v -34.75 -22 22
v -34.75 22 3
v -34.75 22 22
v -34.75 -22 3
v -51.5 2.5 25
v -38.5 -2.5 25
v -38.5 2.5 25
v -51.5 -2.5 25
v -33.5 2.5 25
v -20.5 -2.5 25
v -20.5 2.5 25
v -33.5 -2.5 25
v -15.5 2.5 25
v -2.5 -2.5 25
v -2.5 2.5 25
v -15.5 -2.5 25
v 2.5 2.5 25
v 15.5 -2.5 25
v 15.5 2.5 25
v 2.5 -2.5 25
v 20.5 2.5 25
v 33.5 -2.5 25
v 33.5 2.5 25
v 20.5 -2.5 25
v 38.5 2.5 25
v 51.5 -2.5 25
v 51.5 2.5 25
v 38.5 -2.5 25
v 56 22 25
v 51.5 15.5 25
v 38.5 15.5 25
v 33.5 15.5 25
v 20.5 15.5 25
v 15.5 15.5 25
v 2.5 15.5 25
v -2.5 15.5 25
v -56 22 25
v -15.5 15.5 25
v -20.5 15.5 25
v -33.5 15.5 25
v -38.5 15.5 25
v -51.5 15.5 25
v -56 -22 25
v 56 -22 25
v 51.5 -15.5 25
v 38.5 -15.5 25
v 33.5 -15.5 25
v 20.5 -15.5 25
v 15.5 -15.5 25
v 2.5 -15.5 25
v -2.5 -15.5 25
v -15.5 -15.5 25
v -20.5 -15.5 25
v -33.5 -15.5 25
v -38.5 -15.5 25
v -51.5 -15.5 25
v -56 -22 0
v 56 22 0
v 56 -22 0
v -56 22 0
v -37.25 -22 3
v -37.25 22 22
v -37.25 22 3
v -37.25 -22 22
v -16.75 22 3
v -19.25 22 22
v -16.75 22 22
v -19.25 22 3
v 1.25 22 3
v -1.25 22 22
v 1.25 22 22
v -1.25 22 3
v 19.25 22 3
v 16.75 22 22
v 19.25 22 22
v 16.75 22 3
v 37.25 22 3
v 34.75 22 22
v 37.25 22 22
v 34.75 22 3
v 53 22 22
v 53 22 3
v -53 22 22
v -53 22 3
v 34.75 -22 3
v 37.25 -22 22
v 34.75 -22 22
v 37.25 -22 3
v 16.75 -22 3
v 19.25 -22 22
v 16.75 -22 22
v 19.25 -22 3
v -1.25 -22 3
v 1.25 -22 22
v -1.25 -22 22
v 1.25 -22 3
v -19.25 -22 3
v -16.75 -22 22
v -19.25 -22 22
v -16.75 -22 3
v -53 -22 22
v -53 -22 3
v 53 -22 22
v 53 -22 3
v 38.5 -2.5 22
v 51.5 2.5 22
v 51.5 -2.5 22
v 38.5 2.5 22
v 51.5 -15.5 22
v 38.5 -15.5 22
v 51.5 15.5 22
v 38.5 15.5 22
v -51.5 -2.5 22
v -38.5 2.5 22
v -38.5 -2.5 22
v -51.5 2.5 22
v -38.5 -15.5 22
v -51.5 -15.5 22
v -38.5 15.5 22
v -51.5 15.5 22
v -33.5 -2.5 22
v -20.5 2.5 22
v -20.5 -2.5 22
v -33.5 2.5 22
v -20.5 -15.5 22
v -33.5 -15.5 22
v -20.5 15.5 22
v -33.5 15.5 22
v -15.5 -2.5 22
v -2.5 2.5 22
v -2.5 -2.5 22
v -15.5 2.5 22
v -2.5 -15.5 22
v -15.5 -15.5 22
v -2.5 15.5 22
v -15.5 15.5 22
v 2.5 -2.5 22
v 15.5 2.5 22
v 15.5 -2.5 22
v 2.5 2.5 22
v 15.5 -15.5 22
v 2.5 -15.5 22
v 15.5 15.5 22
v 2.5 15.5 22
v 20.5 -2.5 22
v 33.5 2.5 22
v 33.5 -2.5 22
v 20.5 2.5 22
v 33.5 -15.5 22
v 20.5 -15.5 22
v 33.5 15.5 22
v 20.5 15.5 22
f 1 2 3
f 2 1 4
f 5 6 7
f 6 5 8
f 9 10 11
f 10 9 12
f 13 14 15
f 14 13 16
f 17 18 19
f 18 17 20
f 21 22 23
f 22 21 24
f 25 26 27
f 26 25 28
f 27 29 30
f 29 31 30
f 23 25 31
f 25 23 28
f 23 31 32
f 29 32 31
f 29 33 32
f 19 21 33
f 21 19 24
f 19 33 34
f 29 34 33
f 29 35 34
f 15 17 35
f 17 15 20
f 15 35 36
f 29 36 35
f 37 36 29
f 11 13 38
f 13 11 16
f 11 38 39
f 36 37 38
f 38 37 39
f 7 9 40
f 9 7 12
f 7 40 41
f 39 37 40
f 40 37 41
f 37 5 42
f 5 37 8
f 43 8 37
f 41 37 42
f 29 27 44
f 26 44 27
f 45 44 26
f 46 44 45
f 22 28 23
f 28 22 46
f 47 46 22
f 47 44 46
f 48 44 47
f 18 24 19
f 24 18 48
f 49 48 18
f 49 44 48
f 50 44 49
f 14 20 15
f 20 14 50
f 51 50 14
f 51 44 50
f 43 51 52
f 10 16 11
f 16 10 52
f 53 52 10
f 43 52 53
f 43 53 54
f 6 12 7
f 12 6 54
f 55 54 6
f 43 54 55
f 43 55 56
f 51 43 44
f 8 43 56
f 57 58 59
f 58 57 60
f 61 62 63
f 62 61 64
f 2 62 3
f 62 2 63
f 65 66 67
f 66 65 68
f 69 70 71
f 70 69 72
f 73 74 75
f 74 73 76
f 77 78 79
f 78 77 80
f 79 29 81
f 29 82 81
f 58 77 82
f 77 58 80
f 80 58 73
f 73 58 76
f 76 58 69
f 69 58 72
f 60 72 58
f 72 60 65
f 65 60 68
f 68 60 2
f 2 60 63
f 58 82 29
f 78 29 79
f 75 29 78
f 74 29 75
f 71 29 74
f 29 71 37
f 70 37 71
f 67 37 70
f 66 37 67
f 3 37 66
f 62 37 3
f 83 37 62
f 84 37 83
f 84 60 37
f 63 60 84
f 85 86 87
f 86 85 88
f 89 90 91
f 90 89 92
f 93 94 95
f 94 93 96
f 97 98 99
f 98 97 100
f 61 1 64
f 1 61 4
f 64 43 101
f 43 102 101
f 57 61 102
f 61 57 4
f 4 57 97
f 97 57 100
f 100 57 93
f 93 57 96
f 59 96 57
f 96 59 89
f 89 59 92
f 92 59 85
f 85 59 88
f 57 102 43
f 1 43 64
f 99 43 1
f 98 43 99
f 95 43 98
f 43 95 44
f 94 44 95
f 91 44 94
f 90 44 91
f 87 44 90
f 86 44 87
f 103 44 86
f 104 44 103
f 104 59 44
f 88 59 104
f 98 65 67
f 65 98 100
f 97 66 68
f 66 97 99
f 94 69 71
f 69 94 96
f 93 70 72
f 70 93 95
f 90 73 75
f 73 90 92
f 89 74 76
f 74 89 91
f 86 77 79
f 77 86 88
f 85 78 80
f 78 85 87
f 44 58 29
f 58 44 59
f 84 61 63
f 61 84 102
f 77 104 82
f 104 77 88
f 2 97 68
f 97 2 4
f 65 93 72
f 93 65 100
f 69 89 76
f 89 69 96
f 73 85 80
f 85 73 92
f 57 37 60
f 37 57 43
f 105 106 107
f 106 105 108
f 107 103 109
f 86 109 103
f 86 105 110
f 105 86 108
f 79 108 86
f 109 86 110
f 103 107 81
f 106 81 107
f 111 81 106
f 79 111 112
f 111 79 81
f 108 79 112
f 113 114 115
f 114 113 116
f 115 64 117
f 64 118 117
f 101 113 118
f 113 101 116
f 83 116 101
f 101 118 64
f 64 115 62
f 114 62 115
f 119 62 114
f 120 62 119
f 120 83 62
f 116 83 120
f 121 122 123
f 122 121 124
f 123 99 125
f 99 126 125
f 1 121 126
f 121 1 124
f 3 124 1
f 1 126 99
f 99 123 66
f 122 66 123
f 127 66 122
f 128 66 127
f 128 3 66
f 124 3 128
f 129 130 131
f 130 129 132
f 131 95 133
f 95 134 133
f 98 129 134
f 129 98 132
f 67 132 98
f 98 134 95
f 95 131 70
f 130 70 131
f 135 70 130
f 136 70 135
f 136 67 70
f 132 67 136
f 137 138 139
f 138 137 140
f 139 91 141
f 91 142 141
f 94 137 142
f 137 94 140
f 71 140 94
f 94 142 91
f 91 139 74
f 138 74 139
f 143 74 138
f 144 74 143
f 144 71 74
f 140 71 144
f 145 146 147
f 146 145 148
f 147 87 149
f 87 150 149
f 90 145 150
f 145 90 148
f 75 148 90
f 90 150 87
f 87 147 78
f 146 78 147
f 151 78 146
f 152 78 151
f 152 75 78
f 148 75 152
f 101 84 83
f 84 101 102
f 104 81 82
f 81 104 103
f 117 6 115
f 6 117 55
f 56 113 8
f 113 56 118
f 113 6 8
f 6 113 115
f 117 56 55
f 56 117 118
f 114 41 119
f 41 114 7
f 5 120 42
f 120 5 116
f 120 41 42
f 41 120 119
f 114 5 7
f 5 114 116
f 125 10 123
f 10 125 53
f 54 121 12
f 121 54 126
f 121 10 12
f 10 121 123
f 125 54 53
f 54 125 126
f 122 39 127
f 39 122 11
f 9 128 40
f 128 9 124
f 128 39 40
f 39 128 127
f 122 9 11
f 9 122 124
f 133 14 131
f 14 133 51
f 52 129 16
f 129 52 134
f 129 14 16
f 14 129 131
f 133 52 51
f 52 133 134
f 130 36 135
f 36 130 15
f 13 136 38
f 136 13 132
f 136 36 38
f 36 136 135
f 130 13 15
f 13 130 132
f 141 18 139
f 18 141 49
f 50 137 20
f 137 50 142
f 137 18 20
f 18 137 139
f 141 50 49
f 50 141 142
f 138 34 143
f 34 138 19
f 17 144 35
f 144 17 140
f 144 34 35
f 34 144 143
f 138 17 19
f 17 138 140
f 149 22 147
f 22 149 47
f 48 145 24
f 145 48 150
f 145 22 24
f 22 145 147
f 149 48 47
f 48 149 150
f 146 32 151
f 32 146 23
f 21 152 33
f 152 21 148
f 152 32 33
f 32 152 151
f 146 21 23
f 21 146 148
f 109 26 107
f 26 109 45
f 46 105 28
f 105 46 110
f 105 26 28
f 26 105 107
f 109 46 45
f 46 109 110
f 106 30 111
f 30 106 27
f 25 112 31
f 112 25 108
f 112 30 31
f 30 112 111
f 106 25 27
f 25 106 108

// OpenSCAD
// Open-sided cuvette rack for twelve 12.5mm square cuvettes
// Designed for FDM printing, standing on its base.

// --- Dimensions ---
base_x      = 112.0;  // Length of base plate (X)
base_y      = 44.0;   // Width of base plate (Y)
base_z      = 3.0;    // Thickness of base plate
deck_z_min  = 22.0;   // Bottom of deck plate (Z)
deck_z_max  = 25.0;   // Top of deck plate (Z)
wall_thick  = 3.0;    // Thickness of the end walls
rib_thick   = 2.5;    // Thickness of the internal ribs
hole_size   = 13.0;   // Size of the square holes (13x13mm)
hole_pitch  = 18.0;   // Center-to-center spacing of holes
rows        = 2;      // Number of rows of holes (Y)
cols        = 6;      // Number of columns of holes (X)

// Rib X-positions (centered on origin)
rib_x_pos   = [-36, -18, 0, 18, 36];

$fn = 64;

// --- Modules ---

module walls_and_base() {
    // Base Plate
    translate([-base_x/2, -base_y/2, 0])
        cube([base_x, base_y, base_z]);

    // Deck Plate
    translate([-base_x/2, -base_y/2, deck_z_min])
        cube([base_x, base_y, deck_z_max - deck_z_min]);

    // End walls (flush with short ends)
    // Left end wall
    translate([-base_x/2, -base_y/2, 0])
        cube([wall_thick, base_y, deck_z_max]);
    
    // Right end wall
    translate([base_x/2 - wall_thick, -base_y/2, 0])
        cube([wall_thick, base_y, deck_z_max]);
    
    // Internal ribs
    for (rx = rib_x_pos) {
        translate([rx - (rib_thick/2), -base_y/2, 0])
            cube([rib_thick, base_y, deck_z_max]);
    }
}

module hole_grid() {
    grid_x_span = (cols - 1) * hole_pitch;
    grid_y_span = (rows - 1) * hole_pitch;
    
    for (i = [0 : cols - 1]) {
        for (j = [0 : rows - 1]) {
            // Calculate center of each hole relative to origin (0,0)
            cx = (i - (cols - 1) / 2.0) * hole_pitch;
            cy = (j - (rows - 1) / 2.0) * hole_pitch;
            
            // Subtract from the deck (Z = 22 to 25)
            // We extend the hole slightly in Z to ensure a clean cut
            translate([cx - hole_size/2, cy - hole_size/2, deck_z_min - 0.1])
                cube([hole_size, hole_size, (deck_z_max - deck_z_min) + 0.2]);
        }
    }
}

// --- Final Assembly ---

difference() {
    // The main body of the rack
    walls_and_base();
    
    // Subtract the holes from the deck
    hole_grid();
}
